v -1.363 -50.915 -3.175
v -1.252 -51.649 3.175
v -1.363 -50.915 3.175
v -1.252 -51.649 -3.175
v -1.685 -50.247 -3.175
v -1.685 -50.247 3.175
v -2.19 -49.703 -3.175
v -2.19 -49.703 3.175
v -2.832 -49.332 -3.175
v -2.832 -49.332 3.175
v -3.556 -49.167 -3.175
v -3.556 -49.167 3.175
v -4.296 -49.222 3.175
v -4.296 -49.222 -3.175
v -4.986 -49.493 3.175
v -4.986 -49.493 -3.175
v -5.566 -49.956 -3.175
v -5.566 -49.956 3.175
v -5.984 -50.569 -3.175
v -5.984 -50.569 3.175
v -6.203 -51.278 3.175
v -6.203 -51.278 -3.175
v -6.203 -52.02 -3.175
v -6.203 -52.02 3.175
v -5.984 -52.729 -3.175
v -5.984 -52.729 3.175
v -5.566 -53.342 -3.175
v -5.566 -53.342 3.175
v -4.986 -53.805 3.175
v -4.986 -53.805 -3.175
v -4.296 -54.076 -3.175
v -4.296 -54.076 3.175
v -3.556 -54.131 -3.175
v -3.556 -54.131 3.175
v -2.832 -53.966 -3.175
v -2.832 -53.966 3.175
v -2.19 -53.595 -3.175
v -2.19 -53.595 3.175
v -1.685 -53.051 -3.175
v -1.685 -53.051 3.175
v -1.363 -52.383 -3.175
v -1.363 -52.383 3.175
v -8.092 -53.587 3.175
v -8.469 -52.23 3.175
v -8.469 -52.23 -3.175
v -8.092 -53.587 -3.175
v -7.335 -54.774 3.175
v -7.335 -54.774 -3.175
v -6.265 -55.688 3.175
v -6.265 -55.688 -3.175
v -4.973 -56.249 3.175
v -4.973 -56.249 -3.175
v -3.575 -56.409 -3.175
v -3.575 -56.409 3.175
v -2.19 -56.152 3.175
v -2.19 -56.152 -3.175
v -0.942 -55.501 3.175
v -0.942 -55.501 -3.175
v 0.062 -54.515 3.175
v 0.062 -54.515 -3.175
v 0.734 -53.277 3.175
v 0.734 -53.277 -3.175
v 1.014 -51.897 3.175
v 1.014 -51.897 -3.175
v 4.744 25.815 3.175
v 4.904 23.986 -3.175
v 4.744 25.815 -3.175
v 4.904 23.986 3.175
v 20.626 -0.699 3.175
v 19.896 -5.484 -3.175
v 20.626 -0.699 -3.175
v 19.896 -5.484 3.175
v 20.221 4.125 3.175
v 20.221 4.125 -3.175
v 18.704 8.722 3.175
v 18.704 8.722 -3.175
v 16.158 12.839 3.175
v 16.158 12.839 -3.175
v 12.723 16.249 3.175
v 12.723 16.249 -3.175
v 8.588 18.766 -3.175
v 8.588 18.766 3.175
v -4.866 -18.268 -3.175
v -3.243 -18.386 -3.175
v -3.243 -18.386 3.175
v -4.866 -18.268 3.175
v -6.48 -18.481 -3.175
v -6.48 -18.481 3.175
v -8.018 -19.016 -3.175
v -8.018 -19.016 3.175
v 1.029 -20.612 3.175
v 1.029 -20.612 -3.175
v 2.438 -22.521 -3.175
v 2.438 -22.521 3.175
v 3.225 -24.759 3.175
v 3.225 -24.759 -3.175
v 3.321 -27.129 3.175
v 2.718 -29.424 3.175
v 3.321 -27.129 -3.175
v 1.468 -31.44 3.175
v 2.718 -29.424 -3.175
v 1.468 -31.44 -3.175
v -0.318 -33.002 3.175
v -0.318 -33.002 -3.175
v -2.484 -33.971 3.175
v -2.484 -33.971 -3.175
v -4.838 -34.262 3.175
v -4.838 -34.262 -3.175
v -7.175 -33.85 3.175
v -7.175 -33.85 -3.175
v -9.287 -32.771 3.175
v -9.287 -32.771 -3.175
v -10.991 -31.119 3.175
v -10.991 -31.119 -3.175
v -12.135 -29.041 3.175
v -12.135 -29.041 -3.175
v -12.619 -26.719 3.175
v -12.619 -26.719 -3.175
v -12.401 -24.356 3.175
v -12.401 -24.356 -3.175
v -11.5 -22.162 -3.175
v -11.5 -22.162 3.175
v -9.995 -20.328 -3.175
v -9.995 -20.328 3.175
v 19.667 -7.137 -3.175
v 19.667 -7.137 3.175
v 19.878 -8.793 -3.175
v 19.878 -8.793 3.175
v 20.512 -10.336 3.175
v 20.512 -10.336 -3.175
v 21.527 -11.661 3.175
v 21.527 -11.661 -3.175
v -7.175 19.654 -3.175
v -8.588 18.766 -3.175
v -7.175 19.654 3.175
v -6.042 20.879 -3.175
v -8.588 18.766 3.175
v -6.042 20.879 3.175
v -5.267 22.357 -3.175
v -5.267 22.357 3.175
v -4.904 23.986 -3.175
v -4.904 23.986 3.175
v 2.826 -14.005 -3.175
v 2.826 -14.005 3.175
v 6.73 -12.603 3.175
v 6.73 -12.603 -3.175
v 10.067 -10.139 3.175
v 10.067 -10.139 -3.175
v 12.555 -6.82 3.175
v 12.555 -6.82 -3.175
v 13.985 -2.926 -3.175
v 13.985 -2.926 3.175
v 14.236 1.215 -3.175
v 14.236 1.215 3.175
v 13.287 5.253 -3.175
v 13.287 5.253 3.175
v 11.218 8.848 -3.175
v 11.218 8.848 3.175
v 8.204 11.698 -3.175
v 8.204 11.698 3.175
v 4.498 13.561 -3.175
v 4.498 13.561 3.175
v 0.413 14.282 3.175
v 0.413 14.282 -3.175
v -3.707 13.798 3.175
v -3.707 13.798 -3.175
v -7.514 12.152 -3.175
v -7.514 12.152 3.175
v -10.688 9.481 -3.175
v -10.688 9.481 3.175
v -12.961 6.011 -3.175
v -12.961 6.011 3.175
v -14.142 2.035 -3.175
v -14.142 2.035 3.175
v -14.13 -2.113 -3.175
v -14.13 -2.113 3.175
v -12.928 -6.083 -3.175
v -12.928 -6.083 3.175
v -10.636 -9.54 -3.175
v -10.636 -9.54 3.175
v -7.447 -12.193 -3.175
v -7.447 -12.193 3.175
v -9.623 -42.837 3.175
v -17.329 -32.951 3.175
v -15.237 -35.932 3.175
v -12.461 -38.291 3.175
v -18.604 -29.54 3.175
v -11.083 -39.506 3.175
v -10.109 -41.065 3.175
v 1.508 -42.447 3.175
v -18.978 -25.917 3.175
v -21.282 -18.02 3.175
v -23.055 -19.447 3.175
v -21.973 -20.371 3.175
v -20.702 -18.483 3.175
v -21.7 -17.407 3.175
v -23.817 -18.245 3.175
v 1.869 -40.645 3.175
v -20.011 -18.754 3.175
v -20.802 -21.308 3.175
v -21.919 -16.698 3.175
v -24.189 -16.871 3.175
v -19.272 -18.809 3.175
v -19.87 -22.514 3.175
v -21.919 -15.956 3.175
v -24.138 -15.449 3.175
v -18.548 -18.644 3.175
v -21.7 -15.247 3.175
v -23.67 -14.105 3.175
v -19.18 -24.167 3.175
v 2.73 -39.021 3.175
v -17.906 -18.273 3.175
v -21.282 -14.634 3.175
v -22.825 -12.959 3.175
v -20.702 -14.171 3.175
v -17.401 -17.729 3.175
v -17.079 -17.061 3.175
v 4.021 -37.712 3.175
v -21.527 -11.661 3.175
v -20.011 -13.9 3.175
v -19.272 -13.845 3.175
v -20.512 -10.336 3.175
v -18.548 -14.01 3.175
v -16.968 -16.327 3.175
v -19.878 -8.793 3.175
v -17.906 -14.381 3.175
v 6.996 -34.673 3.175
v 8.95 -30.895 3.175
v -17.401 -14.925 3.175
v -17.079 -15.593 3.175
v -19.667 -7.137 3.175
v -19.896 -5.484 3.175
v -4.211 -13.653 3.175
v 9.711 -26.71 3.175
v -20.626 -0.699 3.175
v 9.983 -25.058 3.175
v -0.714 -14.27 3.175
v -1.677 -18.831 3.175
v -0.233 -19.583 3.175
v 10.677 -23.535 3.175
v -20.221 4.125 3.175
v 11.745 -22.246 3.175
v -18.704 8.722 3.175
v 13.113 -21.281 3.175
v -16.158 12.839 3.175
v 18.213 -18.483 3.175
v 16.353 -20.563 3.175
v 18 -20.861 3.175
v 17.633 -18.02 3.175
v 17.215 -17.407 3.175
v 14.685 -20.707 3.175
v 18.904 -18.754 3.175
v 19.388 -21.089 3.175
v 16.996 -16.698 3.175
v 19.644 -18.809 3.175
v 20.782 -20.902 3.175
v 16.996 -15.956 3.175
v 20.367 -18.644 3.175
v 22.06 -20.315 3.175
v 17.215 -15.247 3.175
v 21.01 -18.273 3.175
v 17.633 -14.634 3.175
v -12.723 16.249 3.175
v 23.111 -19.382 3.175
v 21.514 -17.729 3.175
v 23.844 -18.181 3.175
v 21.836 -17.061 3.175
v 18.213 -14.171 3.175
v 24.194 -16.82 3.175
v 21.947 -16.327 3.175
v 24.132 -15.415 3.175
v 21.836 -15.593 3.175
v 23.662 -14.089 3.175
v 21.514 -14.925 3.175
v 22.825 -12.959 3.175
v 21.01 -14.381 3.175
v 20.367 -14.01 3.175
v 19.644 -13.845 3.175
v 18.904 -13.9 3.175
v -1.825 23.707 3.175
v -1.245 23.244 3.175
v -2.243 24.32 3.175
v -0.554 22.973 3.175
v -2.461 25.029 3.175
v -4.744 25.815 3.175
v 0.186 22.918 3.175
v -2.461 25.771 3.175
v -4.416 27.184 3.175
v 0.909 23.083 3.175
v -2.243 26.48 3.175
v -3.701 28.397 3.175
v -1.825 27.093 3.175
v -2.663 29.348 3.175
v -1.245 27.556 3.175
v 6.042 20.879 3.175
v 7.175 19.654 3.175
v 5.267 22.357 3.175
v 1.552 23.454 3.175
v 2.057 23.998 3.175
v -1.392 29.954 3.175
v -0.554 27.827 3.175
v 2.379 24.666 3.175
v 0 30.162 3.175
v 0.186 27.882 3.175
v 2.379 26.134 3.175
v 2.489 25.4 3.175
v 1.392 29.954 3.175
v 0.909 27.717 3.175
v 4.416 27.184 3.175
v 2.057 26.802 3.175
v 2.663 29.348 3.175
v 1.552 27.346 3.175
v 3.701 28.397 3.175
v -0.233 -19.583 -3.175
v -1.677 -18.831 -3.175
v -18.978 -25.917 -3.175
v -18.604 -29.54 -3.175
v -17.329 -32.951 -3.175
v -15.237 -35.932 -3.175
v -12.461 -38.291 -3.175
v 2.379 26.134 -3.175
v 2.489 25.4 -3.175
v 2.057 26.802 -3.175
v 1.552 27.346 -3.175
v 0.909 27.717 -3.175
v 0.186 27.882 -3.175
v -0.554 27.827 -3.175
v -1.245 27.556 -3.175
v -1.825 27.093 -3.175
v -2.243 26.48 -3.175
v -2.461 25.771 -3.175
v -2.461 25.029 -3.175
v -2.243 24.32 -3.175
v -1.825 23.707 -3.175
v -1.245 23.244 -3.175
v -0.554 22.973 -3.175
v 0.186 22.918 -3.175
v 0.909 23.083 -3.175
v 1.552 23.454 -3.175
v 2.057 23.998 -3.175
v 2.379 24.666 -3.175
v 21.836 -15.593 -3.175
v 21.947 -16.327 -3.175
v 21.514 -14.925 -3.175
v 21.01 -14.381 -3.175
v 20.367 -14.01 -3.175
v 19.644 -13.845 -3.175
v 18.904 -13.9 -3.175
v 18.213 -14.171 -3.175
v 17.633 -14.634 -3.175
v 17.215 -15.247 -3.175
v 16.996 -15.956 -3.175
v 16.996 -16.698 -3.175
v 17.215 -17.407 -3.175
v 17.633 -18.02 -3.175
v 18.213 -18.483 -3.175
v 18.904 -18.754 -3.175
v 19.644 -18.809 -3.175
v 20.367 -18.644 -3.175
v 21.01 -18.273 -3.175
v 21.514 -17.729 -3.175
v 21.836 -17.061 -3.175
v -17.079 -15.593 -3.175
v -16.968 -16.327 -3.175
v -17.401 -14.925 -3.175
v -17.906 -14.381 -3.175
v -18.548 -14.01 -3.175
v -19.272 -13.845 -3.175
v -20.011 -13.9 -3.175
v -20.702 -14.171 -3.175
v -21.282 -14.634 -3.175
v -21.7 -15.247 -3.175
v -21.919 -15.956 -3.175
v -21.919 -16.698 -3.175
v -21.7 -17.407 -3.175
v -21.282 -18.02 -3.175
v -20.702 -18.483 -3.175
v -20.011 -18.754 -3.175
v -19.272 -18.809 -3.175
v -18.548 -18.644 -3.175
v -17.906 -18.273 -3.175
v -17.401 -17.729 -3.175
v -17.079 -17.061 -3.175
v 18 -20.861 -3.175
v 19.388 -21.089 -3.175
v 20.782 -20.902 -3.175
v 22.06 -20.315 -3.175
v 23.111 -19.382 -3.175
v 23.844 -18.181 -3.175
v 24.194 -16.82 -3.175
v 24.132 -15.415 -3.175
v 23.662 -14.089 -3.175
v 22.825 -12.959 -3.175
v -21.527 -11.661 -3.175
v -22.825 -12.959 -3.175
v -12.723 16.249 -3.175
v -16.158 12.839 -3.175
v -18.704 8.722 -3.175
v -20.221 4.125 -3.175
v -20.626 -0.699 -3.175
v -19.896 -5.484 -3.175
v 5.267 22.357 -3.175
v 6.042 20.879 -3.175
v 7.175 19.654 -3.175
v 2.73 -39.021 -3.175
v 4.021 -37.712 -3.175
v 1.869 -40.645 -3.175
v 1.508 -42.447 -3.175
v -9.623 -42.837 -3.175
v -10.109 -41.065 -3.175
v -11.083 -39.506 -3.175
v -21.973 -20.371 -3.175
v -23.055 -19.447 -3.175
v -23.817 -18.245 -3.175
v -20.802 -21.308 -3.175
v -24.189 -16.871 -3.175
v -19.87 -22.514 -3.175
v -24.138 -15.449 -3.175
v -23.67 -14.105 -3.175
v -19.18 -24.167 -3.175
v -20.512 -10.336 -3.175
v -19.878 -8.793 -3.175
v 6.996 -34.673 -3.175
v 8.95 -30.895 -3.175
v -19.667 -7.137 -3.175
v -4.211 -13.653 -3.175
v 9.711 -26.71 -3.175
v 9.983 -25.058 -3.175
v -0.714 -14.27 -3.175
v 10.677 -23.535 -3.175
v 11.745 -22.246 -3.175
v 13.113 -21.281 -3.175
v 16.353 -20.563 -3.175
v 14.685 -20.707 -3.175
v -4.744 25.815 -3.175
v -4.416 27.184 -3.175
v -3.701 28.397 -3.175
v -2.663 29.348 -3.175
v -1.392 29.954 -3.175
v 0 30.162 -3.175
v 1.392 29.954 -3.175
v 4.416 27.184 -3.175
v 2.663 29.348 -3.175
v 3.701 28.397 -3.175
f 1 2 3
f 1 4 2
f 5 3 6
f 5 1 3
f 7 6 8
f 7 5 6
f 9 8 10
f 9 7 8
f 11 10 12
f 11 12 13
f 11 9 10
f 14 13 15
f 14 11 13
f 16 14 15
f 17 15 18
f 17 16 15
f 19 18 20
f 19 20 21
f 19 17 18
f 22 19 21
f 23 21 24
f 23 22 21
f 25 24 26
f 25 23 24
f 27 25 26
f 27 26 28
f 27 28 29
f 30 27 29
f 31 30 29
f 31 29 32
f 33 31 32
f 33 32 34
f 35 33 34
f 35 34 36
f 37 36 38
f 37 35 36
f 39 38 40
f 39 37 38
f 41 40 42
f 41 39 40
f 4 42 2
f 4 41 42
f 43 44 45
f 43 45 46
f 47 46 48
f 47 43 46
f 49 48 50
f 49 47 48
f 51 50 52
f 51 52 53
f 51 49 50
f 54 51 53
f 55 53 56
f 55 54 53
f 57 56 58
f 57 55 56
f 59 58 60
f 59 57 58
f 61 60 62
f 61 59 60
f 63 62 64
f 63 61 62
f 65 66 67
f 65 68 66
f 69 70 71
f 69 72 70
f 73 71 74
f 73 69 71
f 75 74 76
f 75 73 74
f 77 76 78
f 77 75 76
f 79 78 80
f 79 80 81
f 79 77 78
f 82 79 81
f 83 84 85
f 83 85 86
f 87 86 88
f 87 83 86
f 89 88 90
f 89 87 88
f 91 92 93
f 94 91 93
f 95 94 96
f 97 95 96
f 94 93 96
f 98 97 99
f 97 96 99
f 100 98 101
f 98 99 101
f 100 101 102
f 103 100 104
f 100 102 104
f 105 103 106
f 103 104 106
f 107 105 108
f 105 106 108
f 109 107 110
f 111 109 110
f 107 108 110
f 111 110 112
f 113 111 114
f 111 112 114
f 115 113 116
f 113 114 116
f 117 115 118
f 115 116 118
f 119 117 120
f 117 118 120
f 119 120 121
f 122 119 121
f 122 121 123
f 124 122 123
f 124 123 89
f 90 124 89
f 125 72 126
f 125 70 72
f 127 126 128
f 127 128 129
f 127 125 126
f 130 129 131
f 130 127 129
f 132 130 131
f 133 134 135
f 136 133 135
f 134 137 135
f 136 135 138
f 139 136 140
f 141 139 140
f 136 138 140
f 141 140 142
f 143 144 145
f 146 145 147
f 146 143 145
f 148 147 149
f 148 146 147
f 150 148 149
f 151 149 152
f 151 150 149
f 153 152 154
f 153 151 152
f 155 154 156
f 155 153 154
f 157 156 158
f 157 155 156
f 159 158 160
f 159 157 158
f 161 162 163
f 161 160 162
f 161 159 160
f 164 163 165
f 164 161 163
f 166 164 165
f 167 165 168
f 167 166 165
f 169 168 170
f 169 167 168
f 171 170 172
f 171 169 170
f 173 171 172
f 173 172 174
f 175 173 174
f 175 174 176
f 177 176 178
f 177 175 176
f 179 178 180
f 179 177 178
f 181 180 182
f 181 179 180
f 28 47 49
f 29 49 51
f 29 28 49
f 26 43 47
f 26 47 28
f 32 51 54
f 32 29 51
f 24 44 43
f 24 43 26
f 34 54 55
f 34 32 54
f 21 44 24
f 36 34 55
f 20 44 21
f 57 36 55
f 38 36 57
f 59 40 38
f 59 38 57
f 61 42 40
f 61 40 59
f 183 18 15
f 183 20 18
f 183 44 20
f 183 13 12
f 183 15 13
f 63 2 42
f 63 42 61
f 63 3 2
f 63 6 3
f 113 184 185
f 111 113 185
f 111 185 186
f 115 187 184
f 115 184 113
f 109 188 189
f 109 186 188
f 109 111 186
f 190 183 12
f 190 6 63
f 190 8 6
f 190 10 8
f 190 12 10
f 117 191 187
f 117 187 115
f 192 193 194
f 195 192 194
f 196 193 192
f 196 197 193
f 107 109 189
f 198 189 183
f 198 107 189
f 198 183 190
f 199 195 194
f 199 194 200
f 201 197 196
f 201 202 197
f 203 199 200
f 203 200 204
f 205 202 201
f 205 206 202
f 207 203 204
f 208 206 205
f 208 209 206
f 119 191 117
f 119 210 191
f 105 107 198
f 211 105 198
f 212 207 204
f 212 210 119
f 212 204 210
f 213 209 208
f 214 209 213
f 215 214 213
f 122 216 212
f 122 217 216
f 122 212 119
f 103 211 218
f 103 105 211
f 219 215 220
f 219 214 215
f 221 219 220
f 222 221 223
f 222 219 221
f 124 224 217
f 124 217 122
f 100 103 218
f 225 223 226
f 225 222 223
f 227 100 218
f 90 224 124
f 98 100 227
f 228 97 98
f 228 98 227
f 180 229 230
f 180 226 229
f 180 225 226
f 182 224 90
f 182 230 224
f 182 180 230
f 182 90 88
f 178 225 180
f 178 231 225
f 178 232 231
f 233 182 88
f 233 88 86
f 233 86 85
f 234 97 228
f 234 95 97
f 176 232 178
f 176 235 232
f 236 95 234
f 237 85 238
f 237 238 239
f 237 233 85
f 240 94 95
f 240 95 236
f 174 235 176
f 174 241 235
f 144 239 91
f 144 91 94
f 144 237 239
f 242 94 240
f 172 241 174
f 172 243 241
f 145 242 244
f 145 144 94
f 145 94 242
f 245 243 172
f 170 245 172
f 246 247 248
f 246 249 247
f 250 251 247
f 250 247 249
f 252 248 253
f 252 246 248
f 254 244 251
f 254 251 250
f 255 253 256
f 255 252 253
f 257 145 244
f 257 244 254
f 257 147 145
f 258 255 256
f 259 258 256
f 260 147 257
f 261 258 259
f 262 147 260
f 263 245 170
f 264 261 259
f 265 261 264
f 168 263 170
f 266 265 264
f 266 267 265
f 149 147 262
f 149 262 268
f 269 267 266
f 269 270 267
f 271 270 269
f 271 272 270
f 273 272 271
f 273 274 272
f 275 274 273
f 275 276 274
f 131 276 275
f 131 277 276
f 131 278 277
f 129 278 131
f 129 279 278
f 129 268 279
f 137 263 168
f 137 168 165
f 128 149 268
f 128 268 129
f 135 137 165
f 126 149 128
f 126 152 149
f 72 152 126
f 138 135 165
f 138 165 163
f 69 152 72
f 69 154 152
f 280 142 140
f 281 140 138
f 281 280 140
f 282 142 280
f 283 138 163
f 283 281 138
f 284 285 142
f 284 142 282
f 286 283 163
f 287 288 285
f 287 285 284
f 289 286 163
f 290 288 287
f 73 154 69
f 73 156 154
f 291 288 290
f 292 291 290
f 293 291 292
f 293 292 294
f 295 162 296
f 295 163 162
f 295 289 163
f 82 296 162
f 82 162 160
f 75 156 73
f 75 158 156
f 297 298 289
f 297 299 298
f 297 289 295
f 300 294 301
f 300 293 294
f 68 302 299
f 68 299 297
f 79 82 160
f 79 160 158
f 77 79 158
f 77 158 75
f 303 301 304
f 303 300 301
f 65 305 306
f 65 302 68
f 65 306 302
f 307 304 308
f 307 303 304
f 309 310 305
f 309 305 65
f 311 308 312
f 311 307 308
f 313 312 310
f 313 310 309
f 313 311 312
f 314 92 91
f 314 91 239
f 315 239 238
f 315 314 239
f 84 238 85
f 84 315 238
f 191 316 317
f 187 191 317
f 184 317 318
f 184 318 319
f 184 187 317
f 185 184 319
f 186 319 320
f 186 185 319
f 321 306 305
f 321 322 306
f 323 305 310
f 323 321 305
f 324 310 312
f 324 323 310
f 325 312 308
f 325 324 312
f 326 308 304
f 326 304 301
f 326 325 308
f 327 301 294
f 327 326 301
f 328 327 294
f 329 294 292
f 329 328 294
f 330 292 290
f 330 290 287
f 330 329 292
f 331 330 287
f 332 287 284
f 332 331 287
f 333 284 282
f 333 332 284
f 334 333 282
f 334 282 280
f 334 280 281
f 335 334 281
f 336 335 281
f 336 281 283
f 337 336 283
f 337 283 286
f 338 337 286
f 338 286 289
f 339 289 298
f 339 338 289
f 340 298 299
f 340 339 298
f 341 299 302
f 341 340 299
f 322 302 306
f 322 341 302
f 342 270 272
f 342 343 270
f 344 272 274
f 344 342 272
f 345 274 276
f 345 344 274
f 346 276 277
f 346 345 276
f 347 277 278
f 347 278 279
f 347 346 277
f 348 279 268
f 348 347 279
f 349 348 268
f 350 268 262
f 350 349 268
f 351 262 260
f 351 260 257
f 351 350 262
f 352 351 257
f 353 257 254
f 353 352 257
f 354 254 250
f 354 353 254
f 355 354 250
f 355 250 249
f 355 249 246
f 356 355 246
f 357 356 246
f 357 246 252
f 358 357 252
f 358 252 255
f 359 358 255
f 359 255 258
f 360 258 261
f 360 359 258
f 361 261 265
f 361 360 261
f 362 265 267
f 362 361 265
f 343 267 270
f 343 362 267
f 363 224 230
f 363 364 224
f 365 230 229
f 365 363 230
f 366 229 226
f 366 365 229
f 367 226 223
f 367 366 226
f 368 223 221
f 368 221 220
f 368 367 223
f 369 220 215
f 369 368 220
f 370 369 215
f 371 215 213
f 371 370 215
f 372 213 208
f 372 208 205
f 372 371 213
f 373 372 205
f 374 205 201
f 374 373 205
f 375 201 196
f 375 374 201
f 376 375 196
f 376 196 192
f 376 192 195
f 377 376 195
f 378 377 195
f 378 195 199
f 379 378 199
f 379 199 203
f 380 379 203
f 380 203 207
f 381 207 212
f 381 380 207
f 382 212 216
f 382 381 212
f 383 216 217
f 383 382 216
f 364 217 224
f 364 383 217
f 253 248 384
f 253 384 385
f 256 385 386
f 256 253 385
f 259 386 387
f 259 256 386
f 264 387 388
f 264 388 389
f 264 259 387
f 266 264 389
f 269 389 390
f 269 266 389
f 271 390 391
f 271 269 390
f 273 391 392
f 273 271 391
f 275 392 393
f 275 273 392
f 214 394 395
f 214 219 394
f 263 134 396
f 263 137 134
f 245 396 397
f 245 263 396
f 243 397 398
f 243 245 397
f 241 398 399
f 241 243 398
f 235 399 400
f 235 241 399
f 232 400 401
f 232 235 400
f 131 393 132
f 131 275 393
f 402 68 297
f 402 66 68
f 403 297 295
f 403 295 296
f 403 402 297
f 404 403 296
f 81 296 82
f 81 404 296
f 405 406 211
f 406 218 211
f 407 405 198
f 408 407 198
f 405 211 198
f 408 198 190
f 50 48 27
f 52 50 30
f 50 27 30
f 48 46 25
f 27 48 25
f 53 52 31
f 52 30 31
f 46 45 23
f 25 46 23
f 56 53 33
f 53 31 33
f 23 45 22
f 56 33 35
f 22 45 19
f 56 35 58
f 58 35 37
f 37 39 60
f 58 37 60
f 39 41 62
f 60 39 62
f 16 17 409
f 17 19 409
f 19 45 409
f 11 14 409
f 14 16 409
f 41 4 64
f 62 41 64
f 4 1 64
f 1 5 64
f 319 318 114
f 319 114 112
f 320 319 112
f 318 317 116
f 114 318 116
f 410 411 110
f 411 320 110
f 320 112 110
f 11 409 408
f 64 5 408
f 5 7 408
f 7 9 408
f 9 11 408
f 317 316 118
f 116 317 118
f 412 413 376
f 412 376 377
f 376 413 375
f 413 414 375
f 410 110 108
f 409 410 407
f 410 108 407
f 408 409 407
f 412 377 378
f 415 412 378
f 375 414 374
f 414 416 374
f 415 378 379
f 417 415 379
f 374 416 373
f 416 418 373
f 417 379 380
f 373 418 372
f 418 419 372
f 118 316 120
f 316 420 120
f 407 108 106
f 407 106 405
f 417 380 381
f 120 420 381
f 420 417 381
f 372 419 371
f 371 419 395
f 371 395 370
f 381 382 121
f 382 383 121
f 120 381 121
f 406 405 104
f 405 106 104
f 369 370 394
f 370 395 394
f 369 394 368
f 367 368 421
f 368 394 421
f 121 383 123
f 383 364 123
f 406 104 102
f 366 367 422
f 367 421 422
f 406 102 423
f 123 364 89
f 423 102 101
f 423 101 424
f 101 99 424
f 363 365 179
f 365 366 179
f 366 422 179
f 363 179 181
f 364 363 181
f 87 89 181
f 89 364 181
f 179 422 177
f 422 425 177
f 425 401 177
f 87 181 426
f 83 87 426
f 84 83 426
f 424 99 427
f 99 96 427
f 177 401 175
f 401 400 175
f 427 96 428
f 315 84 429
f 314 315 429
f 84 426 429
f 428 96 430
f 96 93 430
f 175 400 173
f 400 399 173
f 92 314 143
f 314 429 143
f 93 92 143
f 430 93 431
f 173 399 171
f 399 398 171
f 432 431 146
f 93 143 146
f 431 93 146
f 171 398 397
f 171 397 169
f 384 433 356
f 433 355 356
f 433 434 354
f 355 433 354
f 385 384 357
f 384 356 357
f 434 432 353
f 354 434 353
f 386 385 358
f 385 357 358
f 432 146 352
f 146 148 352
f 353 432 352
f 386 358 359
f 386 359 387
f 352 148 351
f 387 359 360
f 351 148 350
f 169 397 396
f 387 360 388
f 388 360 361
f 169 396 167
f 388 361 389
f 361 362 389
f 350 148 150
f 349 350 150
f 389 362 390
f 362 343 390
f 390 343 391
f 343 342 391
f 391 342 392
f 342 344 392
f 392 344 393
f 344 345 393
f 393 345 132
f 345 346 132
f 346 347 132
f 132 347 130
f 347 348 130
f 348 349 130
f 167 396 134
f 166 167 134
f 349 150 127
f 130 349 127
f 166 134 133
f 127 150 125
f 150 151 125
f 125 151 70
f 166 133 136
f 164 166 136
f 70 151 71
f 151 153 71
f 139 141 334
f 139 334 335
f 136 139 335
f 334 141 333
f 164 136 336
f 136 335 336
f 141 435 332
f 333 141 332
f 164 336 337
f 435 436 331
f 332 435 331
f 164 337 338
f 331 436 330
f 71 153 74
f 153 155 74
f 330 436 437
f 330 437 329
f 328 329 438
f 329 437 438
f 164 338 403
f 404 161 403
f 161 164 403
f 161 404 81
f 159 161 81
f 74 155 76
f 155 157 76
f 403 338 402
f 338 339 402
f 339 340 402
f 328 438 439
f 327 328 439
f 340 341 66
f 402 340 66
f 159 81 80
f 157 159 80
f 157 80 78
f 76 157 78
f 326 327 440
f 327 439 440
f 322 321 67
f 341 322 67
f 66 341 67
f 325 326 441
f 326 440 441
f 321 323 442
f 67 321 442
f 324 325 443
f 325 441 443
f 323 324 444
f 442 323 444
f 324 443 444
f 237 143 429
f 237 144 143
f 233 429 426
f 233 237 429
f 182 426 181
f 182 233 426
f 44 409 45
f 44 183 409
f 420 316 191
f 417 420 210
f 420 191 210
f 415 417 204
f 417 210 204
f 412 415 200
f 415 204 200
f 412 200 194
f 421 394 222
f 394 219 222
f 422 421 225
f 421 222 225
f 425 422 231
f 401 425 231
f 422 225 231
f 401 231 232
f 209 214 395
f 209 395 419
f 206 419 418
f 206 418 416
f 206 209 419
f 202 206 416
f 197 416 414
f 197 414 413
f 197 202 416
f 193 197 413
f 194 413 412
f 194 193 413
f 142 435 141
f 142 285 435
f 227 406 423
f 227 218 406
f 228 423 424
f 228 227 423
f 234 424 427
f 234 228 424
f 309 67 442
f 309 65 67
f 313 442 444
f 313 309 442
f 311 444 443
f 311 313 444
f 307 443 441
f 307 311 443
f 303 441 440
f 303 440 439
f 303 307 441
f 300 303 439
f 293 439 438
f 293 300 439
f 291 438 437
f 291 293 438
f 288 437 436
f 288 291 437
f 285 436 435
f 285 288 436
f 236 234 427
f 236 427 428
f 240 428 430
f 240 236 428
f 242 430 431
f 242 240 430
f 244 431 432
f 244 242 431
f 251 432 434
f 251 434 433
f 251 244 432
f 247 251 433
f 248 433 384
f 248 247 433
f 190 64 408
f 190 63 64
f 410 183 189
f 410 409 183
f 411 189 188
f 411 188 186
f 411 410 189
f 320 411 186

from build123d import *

# Parameters (mm, degrees)
SKETCH1_R               = 2.4892
SKETCH1_R_2             = 14.2875
BOSS_EXTRUDE1_DEPTH     = 3.175
SKETCH48_R              = 2.4892
BOSS_EXTRUDE2_DEPTH     = 3.175
CUT_EXTRUDE1_DEPTH      = 62.473150941
CUT_EXTRUDE1_DEPTH_BACK = 62.473150941
FILLET1_R               = 6.35


with BuildPart() as part:
    # Sketch1 → Boss-Extrude1 (new, symmetric)
    with BuildSketch(Plane.XY):
        with BuildLine():
            Line((-4.74437725, 25.815079225), (-5.256916026, 19.956734205))
            ThreePointArc((-5.256916026, 19.956734205), (-18.703926955, 8.721784377), (-18.666825827, -8.800910167))
            Line((-18.666825827, -8.800910167), (-22.825124901, -12.959209241))
            ThreePointArc((-22.825124901, -12.959209241), (-23.105815516, -19.388081277), (-16.725871077, -20.228016897))
            Line((-16.725871077, -20.228016897), (-11.908664854, -16.854972787))
            ThreePointArc((-11.908664854, -16.854972787), (0, -20.6375), (11.908664854, -16.854972787))
            Line((11.908664854, -16.854972787), (16.725871077, -20.228016897))
            ThreePointArc((16.725871077, -20.228016897), (23.105815516, -19.388081277), (22.825124901, -12.959209241))
            Line((22.825124901, -12.959209241), (18.666825827, -8.800910167))
            ThreePointArc((18.666825827, -8.800910167), (18.703926955, 8.721784377), (5.256916026, 19.956734205))
            Line((5.256916026, 19.956734205), (4.74437725, 25.815079225))
            ThreePointArc((4.74437725, 25.815079225), (0, 30.1625), (-4.74437725, 25.815079225))
        make_face()
        with Locations((0, 25.4)):
            Circle(SKETCH1_R, mode=Mode.SUBTRACT)
        Circle(SKETCH1_R_2, mode=Mode.SUBTRACT)
        with Locations((19.457528855, -16.326805286)):
            Circle(SKETCH1_R, mode=Mode.SUBTRACT)
        with Locations((-19.457528855, -16.326805286)):
            Circle(SKETCH1_R, mode=Mode.SUBTRACT)
    extrude(amount=BOSS_EXTRUDE1_DEPTH, both=True)

    # Sketch48 → Boss-Extrude2 (add, symmetric)
    with BuildSketch(Plane.XY):
        with BuildLine():
            Line((-10.026080704, -39.562360538), (-8.468509885, -52.230199896))
            ThreePointArc((-8.468509885, -52.230199896), (-3.574599444, -56.408575595), (1.014408673, -51.897457398))
            Line((1.014408673, -51.897457398), (1.680248074, -39.151601649))
            ThreePointArc((1.680248074, -39.151601649), (7.424435707, -34.04649077), (9.71079139, -26.709568641))
            ThreePointArc((9.71079139, -26.709568641), (12.397018184, -21.717853667), (18.000475726, -20.860942737))
            ThreePointArc((18.000475726, -20.860942737), (17.339399127, -20.59235715), (16.725871077, -20.228016897))
            Line((16.725871077, -20.228016897), (11.908664854, -16.854972787))
            ThreePointArc((11.908664854, -16.854972787), (9.92035858, -18.09676468), (7.804051349, -19.105056629))
            ThreePointArc((7.804051349, -19.105056629), (5.636733901, -16.241191156), (2.826163363, -14.005193926))
            ThreePointArc((2.826163363, -14.005193926), (-2.481594068, -14.070335715), (-7.446815831, -12.193342045))
            ThreePointArc((-7.446815831, -12.193342045), (-18.919007392, -24.918243731), (-10.026080704, -39.562360538))
        make_face()
        with Locations((-3.741606205, -51.649004712)):
            Circle(SKETCH48_R, mode=Mode.SUBTRACT)
        with BuildLine():
            ThreePointArc((-8.017864397, -19.016315541), (-3.242789938, -18.386223466), (1.028619665, -20.611849695))
            ThreePointArc((1.028619665, -20.611849695), (-6.021827915, -34.14302987), (-8.017864397, -19.016315541))
        make_face(mode=Mode.SUBTRACT)
    extrude(amount=BOSS_EXTRUDE2_DEPTH, both=True)

    # Sketch48<3> → Cut-Extrude1 (cut, two sides: drawn at the far end of the back side and taken through both)
    with BuildSketch(Plane.XY.offset(-CUT_EXTRUDE1_DEPTH_BACK)):
        with BuildLine():
            ThreePointArc((-8.017864397, -19.016315541), (-3.584524765, -20.323818255), (1.028619665, -20.611849695))
            ThreePointArc((1.028619665, -20.611849695), (-3.242789938, -18.386223466), (-8.017864397, -19.016315541))
        make_face()
    extrude(amount=CUT_EXTRUDE1_DEPTH + CUT_EXTRUDE1_DEPTH_BACK, mode=Mode.SUBTRACT)

    # Fillet1
    fillet1_edges = [part.edges().sort_by_distance(p)[0] for p in [
        (18.666825827, -8.800910167, 0),
        (-18.666825827, -8.800910167, 0),
        (-5.256916026, 19.956734205, 0),
        (5.256916026, 19.956734205, 0),
        (1.680248074, -39.151601649, 0),
        (-17.914364977, -20.832363131, 0),
        (-10.026080704, -39.562360538, 0),
    ]]
    fillet(fillet1_edges, radius=FILLET1_R)


solid = part.part
